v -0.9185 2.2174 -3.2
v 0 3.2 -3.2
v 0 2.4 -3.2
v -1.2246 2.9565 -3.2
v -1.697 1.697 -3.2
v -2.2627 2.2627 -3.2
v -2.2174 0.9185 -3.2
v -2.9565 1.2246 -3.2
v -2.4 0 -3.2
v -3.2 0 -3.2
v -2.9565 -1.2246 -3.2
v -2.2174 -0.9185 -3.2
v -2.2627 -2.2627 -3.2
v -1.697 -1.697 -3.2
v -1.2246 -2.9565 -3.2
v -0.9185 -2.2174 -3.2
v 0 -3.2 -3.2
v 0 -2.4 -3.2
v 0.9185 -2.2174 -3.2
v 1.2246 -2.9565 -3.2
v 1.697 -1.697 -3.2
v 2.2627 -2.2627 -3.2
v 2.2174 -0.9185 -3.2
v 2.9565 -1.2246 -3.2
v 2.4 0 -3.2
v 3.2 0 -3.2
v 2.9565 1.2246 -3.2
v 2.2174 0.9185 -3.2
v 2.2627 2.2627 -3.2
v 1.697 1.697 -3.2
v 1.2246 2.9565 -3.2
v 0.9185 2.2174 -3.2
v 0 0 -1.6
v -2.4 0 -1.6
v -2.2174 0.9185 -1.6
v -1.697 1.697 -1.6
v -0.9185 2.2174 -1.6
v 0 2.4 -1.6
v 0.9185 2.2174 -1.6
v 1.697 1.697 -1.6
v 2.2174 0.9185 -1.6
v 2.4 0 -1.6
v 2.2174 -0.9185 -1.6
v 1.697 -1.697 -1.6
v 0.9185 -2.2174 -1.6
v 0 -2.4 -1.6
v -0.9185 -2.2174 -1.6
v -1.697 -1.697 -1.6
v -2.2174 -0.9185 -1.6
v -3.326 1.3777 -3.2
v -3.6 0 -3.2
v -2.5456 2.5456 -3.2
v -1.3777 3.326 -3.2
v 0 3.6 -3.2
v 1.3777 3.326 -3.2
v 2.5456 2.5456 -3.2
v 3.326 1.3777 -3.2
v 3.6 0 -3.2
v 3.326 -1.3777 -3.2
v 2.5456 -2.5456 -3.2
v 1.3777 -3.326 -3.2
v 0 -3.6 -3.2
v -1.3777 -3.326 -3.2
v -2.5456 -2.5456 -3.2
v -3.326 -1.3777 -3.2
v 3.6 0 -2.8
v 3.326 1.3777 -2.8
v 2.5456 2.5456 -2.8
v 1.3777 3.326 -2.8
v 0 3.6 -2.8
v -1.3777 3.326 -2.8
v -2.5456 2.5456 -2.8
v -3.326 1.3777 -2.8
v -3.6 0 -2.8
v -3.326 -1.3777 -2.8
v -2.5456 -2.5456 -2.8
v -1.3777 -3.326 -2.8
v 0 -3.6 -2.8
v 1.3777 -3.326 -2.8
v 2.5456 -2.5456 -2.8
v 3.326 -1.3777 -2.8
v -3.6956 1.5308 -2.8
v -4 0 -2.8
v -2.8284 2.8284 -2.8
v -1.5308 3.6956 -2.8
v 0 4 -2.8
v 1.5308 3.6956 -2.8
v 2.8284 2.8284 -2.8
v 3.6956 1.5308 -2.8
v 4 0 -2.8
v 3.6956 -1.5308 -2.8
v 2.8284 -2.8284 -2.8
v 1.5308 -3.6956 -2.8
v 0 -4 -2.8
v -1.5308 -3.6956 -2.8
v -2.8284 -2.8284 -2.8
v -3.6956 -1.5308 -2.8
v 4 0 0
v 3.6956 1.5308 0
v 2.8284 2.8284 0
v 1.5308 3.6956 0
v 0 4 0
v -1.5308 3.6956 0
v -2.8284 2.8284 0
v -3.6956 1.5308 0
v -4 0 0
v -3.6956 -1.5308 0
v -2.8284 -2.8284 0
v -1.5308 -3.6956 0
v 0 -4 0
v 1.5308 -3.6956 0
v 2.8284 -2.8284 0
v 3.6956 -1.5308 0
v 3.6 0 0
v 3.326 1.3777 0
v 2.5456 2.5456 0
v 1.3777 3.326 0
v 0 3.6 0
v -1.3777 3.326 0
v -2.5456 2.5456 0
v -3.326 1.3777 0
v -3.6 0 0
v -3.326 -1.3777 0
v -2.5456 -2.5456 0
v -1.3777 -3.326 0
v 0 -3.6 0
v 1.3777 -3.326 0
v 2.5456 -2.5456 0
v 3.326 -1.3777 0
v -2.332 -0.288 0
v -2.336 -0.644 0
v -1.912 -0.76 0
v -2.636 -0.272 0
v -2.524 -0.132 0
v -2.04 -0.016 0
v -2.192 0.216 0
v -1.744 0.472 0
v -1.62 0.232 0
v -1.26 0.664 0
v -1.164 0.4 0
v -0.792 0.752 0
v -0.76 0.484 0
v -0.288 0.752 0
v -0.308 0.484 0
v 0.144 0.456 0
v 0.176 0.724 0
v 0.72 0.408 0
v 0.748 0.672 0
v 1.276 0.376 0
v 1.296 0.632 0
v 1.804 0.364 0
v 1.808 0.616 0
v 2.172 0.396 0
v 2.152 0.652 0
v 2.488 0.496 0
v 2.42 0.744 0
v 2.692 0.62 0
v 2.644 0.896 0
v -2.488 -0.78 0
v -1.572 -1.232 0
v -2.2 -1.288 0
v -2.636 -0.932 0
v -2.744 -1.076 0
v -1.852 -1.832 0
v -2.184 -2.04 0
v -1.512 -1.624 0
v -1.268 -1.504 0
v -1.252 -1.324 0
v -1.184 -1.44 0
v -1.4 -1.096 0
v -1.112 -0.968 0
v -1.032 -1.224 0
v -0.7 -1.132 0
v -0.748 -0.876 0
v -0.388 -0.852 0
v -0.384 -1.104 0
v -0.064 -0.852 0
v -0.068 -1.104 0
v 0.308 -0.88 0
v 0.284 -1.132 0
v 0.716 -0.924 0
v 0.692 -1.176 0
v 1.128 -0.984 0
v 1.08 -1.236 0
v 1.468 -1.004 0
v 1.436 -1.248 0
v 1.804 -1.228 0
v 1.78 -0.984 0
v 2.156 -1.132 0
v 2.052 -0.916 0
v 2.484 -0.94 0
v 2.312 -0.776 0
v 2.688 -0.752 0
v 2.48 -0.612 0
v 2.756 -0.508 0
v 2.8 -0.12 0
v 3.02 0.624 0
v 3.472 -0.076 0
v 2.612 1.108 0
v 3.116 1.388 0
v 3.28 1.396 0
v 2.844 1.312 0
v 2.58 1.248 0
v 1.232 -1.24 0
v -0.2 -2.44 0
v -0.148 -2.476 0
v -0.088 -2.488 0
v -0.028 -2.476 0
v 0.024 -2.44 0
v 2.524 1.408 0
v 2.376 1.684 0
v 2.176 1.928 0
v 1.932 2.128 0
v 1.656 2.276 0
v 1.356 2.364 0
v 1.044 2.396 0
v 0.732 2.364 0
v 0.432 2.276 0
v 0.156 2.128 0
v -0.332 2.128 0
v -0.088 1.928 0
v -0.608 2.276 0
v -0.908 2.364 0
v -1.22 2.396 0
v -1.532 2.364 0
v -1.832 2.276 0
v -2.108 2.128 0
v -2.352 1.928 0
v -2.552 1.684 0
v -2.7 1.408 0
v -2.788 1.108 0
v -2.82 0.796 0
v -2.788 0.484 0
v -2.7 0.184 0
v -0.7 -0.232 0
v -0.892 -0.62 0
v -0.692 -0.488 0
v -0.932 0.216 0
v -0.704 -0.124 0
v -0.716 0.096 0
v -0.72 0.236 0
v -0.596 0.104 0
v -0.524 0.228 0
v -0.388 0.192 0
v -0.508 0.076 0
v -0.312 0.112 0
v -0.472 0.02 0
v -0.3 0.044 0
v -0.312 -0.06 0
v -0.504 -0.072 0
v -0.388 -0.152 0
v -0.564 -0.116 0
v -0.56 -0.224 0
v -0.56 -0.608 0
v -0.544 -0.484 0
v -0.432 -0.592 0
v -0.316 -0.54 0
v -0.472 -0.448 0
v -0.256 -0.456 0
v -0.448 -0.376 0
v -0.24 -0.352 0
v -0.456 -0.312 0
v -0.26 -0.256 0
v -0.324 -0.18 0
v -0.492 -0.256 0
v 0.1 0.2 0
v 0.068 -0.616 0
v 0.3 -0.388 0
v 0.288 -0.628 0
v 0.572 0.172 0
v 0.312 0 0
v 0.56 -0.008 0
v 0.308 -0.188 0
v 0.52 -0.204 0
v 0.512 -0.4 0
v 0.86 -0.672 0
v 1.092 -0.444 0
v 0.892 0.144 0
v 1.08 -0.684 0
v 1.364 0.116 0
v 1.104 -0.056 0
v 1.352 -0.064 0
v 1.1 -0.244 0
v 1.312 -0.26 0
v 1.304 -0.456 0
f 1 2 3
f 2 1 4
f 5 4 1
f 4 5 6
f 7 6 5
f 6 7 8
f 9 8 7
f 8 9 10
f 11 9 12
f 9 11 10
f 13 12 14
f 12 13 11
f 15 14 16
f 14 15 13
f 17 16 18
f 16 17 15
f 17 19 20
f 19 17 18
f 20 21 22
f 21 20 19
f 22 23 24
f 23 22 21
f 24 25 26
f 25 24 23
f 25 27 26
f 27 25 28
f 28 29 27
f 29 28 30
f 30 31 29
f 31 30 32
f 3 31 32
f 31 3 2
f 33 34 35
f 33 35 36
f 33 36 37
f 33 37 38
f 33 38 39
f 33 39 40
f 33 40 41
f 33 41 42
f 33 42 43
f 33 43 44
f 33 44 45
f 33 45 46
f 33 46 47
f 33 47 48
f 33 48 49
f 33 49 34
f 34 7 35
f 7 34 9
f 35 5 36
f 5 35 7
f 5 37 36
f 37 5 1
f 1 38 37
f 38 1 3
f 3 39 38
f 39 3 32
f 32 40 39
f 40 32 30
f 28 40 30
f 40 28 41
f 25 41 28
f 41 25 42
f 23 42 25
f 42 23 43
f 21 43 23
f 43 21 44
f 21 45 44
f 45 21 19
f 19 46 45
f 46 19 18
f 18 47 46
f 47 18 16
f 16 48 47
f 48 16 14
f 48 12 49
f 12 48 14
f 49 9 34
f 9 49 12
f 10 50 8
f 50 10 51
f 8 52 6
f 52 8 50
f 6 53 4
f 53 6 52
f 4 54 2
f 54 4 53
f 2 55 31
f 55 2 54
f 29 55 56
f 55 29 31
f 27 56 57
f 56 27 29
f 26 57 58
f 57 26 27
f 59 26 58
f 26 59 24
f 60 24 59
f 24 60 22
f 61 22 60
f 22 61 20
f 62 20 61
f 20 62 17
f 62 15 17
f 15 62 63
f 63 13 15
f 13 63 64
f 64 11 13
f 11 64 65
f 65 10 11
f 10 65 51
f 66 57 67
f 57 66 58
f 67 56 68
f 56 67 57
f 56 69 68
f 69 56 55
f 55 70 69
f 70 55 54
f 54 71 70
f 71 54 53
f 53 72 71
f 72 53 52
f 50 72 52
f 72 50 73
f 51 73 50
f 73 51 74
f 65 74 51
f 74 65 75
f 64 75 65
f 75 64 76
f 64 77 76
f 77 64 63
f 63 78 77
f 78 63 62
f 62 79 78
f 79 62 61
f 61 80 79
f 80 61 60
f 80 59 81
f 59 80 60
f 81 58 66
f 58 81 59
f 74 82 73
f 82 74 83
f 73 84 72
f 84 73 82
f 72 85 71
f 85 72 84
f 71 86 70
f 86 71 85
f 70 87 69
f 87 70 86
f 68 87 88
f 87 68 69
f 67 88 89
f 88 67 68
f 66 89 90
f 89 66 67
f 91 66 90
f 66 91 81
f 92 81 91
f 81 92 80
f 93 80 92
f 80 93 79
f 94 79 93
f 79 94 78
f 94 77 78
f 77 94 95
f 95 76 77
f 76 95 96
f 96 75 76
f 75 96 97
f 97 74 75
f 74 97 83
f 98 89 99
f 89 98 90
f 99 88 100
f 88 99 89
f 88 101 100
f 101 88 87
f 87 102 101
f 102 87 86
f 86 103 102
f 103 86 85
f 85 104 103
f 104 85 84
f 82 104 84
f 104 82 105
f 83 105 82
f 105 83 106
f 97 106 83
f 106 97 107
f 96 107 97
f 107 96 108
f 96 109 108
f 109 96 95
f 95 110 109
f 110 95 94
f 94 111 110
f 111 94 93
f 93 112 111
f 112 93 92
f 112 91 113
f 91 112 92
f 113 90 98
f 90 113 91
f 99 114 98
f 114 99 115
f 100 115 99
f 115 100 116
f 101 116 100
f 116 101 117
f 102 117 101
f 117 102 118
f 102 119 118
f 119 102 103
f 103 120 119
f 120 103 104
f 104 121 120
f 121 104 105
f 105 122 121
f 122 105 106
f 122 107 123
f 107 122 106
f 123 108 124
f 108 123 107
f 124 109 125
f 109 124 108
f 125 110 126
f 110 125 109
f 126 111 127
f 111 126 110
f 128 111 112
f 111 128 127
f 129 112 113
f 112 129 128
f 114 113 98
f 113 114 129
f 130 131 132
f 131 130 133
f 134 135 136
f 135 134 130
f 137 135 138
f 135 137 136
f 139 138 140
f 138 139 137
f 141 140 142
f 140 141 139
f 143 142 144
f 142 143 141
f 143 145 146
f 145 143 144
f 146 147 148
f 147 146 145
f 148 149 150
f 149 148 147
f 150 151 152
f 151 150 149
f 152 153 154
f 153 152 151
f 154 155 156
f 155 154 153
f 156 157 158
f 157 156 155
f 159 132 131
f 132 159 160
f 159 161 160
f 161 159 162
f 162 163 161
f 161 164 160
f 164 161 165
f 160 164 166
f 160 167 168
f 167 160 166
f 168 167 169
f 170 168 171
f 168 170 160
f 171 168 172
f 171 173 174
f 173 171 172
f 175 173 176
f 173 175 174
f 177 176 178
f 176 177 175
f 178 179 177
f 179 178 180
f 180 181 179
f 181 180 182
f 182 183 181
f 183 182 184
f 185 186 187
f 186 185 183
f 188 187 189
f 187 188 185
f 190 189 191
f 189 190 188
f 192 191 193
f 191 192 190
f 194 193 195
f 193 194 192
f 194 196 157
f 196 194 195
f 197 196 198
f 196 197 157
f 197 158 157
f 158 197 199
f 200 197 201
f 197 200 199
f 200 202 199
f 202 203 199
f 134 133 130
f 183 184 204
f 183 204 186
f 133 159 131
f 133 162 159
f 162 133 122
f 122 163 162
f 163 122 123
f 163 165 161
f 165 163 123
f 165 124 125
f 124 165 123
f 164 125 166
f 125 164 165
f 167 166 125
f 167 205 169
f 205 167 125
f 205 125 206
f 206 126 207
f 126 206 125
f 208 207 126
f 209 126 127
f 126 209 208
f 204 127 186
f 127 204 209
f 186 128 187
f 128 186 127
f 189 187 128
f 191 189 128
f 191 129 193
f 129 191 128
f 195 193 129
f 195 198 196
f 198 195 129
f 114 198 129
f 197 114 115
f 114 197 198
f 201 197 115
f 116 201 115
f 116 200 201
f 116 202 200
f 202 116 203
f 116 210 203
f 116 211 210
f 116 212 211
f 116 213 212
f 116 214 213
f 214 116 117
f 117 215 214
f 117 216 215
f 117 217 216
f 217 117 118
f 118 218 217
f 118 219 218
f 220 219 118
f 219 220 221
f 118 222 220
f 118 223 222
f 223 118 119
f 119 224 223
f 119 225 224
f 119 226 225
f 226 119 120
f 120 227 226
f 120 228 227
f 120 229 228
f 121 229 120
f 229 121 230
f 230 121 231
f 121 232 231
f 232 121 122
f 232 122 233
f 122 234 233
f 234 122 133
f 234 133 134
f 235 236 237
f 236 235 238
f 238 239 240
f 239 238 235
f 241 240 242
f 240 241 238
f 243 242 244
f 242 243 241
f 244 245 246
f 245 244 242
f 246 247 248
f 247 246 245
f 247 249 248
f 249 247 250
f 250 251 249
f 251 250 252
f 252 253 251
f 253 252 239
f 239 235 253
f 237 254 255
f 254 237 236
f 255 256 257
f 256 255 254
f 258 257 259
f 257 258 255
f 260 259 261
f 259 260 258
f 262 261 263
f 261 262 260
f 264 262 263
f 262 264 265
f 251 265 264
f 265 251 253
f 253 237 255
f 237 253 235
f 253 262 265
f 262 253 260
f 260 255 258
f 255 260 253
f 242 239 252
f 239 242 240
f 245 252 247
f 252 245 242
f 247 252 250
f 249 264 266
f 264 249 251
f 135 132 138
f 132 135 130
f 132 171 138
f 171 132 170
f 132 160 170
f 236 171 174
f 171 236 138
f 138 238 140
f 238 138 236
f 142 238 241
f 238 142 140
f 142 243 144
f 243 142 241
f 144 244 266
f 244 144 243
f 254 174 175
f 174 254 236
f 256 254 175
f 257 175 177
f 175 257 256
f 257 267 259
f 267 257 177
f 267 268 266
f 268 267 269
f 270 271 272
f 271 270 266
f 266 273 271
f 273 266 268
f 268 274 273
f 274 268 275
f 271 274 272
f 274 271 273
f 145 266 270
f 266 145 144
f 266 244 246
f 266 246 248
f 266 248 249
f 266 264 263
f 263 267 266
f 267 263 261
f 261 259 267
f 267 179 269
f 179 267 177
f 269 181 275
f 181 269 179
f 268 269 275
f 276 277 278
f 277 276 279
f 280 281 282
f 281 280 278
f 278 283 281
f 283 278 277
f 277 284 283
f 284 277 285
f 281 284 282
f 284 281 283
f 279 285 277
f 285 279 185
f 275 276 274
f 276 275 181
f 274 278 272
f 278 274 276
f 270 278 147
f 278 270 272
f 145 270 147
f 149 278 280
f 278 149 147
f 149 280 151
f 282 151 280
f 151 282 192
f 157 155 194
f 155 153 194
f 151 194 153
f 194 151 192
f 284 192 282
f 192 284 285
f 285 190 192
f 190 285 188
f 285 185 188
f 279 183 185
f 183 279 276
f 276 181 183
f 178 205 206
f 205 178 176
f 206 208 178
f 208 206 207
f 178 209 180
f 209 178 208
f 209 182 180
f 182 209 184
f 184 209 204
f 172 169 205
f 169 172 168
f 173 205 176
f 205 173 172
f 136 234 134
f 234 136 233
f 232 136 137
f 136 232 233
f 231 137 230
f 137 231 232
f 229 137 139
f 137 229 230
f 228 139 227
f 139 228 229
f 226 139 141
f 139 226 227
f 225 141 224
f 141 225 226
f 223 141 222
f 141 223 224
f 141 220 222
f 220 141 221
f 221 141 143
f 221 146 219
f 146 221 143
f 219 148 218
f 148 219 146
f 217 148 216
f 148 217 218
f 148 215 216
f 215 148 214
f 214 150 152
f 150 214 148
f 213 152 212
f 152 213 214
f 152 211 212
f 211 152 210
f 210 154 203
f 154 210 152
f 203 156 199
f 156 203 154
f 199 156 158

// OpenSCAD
use <../lib.scad>
use <s/98138p1ds01.scad>
use <s/98138p1ds02.scad>
$fa=1; $fs=0.2;
function ldraw_lib__98138p1d(realsolid=false) = [
// 0 Tile  1 x  1 Round with Dark Turquoise Heart and Medium Lilac Banner with "BFF" Pattern
// 0 Name: 98138p1d.dat
// 0 Author: Gerald Lasser [GeraldLasser]
// 0 !LDRAW_ORG Part UPDATE 2022-03
// 0 !LICENSE Licensed under CC BY 2.0 and CC BY 4.0 : see CAreadme.txt
// 
// 0 BFC CERTIFY CCW
  [0,"BFC","CERTIFY"],
  [0,"BFC","CCW"],
// 
// 0 !KEYWORDS Best Friends Forever, Bricklink 98138pb147, Dots, Mega Pack
// 0 !KEYWORDS Set 41913
// 
// 0 !HISTORY 2021-06-14 [RainbowDolphin] Subfiled patterns for colour variants
// 0 !HISTORY 2022-05-07 [PTadmin] Official Update 2022-03
// 
// 
// 1 16 0 0 0 1 0 0 0 1 0 0 0 1 s\98138p1ds01.dat
  [1,16,0,0,0,1,0,0,0,1,0,0,0,1, ldraw_lib__s__98138p1ds01(realsolid)],
// 1 3 0 0 0 1 0 0 0 1 0 0 0 1 s\98138p1ds02.dat
  [1,3,0,0,0,1,0,0,0,1,0,0,0,1, ldraw_lib__s__98138p1ds02(realsolid)],
];
module ldraw_lib__98138p1d(step=0, col=false, unit=2/5, alt=false, line=0.2, solid=!$preview)
    makepoly(ldraw_lib__98138p1d(solid), step=step, col=col, unit=unit, alt=alt, line=line, solid=solid);
ldraw_lib__98138p1d(line=0.2);
